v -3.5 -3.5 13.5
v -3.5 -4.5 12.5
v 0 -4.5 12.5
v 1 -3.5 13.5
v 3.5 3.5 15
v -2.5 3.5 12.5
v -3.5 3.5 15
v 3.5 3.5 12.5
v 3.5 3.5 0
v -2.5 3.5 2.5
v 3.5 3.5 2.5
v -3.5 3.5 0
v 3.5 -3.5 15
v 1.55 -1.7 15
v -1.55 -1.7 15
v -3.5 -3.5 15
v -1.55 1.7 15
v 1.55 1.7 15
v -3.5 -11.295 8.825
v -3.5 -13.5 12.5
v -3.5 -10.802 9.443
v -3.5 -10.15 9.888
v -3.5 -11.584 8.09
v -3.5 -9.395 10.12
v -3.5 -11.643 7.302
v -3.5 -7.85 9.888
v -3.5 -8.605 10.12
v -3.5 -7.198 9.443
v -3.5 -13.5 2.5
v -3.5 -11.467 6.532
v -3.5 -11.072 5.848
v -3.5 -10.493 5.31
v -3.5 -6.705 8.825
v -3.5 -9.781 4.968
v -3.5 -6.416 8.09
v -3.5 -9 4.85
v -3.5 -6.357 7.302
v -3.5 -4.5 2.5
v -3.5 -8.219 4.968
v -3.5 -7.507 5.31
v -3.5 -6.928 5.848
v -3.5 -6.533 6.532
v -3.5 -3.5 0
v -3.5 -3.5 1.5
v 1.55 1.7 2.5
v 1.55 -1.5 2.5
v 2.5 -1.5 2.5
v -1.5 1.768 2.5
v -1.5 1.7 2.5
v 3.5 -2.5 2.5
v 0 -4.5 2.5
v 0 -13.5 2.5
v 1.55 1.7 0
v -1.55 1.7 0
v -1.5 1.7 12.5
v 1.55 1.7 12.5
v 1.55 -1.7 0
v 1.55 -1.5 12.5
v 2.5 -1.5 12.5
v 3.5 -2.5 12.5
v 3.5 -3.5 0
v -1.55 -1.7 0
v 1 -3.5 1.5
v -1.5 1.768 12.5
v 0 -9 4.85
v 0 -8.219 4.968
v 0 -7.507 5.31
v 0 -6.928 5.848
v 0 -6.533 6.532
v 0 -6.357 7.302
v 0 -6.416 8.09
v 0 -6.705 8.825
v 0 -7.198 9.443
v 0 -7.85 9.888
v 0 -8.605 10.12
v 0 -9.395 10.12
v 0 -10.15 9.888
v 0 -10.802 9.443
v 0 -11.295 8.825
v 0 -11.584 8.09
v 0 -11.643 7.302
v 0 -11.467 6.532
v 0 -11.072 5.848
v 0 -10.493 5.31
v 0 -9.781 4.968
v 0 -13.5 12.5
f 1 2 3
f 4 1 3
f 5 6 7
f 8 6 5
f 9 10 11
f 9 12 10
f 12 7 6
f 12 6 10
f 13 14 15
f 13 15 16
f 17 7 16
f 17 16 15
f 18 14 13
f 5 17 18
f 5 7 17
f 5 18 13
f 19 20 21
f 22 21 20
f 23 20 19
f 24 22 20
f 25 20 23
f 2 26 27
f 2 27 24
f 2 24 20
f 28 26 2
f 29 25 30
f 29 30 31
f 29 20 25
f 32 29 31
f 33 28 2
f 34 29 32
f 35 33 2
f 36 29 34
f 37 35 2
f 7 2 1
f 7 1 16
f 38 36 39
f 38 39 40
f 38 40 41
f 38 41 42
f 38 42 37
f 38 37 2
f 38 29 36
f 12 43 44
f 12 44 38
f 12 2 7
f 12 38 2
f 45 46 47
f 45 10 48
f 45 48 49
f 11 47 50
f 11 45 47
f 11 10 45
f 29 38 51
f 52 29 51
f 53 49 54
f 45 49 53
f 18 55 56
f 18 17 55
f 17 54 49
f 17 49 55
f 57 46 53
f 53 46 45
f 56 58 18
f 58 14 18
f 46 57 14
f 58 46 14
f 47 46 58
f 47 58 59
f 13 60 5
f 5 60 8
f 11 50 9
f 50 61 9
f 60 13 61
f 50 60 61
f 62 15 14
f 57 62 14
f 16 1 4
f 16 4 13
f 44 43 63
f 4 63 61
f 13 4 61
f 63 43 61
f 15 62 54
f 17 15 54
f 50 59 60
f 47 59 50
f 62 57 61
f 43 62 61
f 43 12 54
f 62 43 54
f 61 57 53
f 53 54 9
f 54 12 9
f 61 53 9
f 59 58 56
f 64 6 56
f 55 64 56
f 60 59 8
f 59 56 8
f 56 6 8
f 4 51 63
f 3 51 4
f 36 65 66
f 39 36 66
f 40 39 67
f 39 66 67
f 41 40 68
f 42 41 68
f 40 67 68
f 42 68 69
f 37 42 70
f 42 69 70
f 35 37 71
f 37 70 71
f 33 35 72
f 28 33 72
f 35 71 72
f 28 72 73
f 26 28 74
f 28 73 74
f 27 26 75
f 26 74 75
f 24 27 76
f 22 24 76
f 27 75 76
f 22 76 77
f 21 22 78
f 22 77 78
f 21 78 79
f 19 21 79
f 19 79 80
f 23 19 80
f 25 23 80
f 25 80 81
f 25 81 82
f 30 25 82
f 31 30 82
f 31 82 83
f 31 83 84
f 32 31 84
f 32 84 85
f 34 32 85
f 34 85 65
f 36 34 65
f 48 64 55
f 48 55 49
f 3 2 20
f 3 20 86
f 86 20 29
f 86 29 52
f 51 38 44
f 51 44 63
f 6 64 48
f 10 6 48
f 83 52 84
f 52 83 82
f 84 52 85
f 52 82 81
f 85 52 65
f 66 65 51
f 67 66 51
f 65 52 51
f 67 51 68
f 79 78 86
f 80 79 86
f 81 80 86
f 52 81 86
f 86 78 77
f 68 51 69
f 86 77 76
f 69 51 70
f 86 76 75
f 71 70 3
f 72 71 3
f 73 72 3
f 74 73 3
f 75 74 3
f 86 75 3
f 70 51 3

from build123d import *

# Parameters (mm, degrees)
SKIZZE1_W                       = 7
SKIZZE1_H                       = 7
AUFSATZ_LINEAR_AUSTRAGEN1_DEPTH = 15
SKIZZE2_W                       = 3.1
SKIZZE2_H                       = 3.4
SCHNITT_LINEAR_AUSTRAGEN1_DEPTH = 16.795568999
SKIZZE3_W                       = 5
SKIZZE3_H                       = 10
SCHNITT_LINEAR_AUSTRAGEN2_DEPTH = 5
FASE2_SIZE                      = 1
FASE2_SIZE2                     = 1.732050808
SKIZZE5_W                       = 3.5
SKIZZE5_H                       = 10
AUFSATZ_LINEAR_AUSTRAGEN2_DEPTH = 10
FASE3_SIZE                      = 1
SKIZZE6_R                       = 2.65
SCHNITT_LINEAR_AUSTRAGEN3_DEPTH = 10
FASE4_SIZE                      = 1


with BuildPart() as part:
    # Skizze1 → Aufsatz-Linear austragen1 (new body)
    with BuildSketch(Plane.XY):
        Rectangle(SKIZZE1_W, SKIZZE1_H)
    extrude(amount=AUFSATZ_LINEAR_AUSTRAGEN1_DEPTH)

    # Skizze2 → Schnitt-Linear austragen1 (cut, through all)
    with BuildSketch(Plane.XY.offset(15)):
        Rectangle(SKIZZE2_W, SKIZZE2_H)
    extrude(amount=-SCHNITT_LINEAR_AUSTRAGEN1_DEPTH, mode=Mode.SUBTRACT)

    # Skizze3 → Schnitt-Linear austragen2 (cut)
    with BuildSketch(Plane(origin=(0, 3.5, 0), x_dir=(1, 0, 0), z_dir=(0, 1, 0))):
        with Locations((1, -7.5)):
            Rectangle(SKIZZE3_W, SKIZZE3_H)
    extrude(amount=-SCHNITT_LINEAR_AUSTRAGEN2_DEPTH, mode=Mode.SUBTRACT)

    # Fase2
    fase2_edges = [part.edges().sort_by_distance(p)[0] for p in [
        (-1.5, 3.5, 7.5),
    ]]
    fase2_side = [part.faces().sort_by_distance(p)[0] for p in [
        (0, 3.5, 0.165529454),
    ]]
    chamfer(fase2_edges, length=FASE2_SIZE, length2=FASE2_SIZE2, reference=fase2_side[0])

    # Skizze5 → Aufsatz-Linear austragen2 (add)
    with BuildSketch(Plane.XZ.offset(3.5)):
        with Locations((-1.75, 7.5)):
            Rectangle(SKIZZE5_W, SKIZZE5_H)
    extrude(amount=AUFSATZ_LINEAR_AUSTRAGEN2_DEPTH)

    # Fase3
    fase3_edges = [part.edges().sort_by_distance(p)[0] for p in [
        (-1.75, -3.5, 2.5),
        (0, -3.5, 7.5),
        (-1.75, -3.5, 12.5),
    ]]
    chamfer(fase3_edges, length=FASE3_SIZE)

    # Skizze6 → Schnitt-Linear austragen3 (cut)
    with BuildSketch(Plane(origin=(0, 0, 0), x_dir=(0, 0, -1), z_dir=(1, 0, 0))):
        with Locations((-7.5, -9)):
            Circle(SKIZZE6_R)
    extrude(amount=-SCHNITT_LINEAR_AUSTRAGEN3_DEPTH, mode=Mode.SUBTRACT)

    # Fase4
    fase4_edges = [part.edges().sort_by_distance(p)[0] for p in [
        (3.5, -1.5, 7.5),
    ]]
    chamfer(fase4_edges, length=FASE4_SIZE)


solid = part.part
